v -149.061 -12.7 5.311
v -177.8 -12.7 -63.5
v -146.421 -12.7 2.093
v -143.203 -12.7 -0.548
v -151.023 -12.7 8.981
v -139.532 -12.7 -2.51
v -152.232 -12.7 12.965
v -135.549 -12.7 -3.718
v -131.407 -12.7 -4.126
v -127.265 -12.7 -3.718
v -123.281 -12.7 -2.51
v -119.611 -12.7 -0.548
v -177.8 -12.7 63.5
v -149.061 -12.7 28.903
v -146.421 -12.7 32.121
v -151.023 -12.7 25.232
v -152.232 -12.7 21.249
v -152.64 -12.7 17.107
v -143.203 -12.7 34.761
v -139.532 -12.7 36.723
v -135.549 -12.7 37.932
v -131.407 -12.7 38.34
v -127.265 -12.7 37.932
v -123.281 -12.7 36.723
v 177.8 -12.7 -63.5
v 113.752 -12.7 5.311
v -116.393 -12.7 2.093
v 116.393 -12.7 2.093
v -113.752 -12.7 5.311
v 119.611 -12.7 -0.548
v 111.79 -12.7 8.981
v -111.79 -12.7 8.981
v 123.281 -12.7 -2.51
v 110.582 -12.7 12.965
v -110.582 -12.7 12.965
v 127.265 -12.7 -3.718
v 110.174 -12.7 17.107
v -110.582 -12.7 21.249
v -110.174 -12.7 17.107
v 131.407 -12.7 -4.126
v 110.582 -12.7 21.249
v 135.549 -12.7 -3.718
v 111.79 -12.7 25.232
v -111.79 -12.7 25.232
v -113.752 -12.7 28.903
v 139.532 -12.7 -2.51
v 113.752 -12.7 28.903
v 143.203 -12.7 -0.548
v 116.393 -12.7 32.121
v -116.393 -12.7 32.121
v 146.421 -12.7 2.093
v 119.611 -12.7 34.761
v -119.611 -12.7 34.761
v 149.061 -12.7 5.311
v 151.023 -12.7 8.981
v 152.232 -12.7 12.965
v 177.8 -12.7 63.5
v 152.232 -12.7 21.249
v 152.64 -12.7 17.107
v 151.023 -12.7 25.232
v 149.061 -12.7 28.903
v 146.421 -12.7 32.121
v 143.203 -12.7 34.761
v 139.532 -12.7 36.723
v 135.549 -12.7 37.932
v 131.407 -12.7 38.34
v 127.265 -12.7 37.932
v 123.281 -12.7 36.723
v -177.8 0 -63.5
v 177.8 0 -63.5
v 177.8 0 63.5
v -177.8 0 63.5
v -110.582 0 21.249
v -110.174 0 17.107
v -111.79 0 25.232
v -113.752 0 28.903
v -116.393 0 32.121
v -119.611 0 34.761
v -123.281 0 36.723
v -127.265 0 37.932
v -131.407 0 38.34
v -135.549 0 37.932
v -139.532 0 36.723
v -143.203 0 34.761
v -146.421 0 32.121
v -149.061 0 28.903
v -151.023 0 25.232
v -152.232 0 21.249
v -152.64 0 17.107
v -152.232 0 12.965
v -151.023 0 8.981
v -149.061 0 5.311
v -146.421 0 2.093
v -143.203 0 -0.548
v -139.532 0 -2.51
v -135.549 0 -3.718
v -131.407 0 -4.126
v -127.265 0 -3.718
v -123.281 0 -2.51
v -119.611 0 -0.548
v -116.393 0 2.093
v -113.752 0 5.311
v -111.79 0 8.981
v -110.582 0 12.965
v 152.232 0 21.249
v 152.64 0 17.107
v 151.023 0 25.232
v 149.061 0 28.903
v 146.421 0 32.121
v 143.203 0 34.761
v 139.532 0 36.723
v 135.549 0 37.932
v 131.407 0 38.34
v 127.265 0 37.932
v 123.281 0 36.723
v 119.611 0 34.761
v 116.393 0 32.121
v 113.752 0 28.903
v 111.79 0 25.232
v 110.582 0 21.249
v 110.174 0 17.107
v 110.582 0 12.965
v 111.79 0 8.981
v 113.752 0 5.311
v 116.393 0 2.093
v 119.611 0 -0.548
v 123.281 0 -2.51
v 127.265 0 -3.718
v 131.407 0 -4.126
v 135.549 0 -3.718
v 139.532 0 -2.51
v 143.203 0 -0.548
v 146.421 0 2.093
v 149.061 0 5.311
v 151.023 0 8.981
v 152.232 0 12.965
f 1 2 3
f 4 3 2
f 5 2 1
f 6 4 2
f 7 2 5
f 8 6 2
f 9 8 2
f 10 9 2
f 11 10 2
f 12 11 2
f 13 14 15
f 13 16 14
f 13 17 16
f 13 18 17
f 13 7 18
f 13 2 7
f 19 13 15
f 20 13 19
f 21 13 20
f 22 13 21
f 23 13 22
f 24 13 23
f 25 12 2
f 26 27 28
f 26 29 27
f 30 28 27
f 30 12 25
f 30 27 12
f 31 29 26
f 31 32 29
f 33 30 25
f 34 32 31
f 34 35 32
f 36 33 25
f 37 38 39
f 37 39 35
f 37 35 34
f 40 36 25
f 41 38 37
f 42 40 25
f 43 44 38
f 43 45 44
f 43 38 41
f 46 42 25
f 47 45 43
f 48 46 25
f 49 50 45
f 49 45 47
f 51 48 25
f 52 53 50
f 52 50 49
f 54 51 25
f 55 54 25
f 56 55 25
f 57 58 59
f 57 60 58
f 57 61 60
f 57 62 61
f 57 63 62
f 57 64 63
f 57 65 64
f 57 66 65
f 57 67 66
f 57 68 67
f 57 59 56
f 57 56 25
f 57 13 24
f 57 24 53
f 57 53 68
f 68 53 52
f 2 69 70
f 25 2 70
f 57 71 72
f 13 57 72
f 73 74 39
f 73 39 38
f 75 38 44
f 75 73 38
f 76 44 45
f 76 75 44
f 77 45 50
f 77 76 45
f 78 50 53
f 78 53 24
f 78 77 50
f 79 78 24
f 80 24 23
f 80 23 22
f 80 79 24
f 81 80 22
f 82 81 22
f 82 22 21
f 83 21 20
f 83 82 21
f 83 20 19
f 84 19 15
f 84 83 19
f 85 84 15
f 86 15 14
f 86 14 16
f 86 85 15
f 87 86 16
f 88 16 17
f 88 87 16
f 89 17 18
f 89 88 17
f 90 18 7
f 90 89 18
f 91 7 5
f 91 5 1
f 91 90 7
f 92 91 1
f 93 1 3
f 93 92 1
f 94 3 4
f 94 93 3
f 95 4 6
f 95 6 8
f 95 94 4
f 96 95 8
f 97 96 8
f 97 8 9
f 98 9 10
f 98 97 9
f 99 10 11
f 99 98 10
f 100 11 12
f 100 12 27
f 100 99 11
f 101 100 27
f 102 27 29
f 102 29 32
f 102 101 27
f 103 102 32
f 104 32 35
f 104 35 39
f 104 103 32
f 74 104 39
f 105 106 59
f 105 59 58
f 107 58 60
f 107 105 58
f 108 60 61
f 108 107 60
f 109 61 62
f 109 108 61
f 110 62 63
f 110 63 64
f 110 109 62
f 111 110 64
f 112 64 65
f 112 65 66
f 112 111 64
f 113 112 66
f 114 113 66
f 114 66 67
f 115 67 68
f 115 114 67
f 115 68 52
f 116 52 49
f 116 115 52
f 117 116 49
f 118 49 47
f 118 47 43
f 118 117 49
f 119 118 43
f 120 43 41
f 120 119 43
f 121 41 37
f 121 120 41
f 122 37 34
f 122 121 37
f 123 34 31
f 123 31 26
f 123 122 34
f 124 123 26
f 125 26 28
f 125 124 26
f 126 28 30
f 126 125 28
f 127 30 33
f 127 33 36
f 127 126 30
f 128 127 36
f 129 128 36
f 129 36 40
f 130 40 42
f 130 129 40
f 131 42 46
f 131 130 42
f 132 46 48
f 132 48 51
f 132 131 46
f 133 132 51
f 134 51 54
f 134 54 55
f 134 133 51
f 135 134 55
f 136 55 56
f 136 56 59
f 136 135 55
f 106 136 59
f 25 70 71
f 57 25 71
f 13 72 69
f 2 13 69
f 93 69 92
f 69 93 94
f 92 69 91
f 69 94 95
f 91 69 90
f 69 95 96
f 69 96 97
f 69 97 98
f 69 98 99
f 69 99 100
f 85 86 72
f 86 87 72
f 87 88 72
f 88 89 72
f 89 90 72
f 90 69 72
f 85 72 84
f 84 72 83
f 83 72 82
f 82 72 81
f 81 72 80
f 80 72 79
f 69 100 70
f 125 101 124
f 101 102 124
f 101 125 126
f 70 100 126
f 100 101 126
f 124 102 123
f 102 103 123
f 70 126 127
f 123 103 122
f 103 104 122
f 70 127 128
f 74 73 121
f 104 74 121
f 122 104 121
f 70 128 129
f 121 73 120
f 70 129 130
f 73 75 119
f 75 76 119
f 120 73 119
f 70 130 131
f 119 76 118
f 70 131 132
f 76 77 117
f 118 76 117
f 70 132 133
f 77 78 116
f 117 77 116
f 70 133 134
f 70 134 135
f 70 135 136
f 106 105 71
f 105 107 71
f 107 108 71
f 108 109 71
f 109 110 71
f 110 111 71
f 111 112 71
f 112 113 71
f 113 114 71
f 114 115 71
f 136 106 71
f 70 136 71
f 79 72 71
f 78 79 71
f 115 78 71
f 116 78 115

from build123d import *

# Parameters (mm, degrees)
F0_R     = 21.2328125
F1_DEPTH = 12.7
F2_DEPTH = 385


# Not quite as in the source:
# - an extrude ends at something that could not be found from the text; its depth is read off the source's solid


with BuildPart() as f1:
    # F0 (on Front) → F1 (new body)
    with BuildSketch(Plane.XZ):
        Polygon((177.8, 17.1069), (177.8, 63.5), (131.4069, 63.5), (-131.4069, 63.5), (-177.8, 63.5), (-177.8, 17.1069), (-177.8, -63.5), (177.8, -63.5), align=None)
        with Locations((-131.4069, 17.1069)):
            Circle(F0_R, mode=Mode.SUBTRACT)
        with Locations((131.4069, 17.1069)):
            Circle(F0_R, mode=Mode.SUBTRACT)
    extrude(amount=F1_DEPTH)

    # F0 (on Front) → F2 (cut, through all)
    with BuildSketch(Plane.XZ):
        Polygon((177.8, 17.1069), (177.8, 63.5), (131.4069, 63.5), (-131.4069, 63.5), (-177.8, 63.5), (-177.8, 17.1069), (-177.8, -63.5), (177.8, -63.5), align=None)
        with Locations((-131.4069, 17.1069)):
            Circle(F0_R, mode=Mode.SUBTRACT)
        with Locations((131.4069, 17.1069)):
            Circle(F0_R, mode=Mode.SUBTRACT)
    extrude(amount=-F2_DEPTH, mode=Mode.SUBTRACT)


solid = f1.part
